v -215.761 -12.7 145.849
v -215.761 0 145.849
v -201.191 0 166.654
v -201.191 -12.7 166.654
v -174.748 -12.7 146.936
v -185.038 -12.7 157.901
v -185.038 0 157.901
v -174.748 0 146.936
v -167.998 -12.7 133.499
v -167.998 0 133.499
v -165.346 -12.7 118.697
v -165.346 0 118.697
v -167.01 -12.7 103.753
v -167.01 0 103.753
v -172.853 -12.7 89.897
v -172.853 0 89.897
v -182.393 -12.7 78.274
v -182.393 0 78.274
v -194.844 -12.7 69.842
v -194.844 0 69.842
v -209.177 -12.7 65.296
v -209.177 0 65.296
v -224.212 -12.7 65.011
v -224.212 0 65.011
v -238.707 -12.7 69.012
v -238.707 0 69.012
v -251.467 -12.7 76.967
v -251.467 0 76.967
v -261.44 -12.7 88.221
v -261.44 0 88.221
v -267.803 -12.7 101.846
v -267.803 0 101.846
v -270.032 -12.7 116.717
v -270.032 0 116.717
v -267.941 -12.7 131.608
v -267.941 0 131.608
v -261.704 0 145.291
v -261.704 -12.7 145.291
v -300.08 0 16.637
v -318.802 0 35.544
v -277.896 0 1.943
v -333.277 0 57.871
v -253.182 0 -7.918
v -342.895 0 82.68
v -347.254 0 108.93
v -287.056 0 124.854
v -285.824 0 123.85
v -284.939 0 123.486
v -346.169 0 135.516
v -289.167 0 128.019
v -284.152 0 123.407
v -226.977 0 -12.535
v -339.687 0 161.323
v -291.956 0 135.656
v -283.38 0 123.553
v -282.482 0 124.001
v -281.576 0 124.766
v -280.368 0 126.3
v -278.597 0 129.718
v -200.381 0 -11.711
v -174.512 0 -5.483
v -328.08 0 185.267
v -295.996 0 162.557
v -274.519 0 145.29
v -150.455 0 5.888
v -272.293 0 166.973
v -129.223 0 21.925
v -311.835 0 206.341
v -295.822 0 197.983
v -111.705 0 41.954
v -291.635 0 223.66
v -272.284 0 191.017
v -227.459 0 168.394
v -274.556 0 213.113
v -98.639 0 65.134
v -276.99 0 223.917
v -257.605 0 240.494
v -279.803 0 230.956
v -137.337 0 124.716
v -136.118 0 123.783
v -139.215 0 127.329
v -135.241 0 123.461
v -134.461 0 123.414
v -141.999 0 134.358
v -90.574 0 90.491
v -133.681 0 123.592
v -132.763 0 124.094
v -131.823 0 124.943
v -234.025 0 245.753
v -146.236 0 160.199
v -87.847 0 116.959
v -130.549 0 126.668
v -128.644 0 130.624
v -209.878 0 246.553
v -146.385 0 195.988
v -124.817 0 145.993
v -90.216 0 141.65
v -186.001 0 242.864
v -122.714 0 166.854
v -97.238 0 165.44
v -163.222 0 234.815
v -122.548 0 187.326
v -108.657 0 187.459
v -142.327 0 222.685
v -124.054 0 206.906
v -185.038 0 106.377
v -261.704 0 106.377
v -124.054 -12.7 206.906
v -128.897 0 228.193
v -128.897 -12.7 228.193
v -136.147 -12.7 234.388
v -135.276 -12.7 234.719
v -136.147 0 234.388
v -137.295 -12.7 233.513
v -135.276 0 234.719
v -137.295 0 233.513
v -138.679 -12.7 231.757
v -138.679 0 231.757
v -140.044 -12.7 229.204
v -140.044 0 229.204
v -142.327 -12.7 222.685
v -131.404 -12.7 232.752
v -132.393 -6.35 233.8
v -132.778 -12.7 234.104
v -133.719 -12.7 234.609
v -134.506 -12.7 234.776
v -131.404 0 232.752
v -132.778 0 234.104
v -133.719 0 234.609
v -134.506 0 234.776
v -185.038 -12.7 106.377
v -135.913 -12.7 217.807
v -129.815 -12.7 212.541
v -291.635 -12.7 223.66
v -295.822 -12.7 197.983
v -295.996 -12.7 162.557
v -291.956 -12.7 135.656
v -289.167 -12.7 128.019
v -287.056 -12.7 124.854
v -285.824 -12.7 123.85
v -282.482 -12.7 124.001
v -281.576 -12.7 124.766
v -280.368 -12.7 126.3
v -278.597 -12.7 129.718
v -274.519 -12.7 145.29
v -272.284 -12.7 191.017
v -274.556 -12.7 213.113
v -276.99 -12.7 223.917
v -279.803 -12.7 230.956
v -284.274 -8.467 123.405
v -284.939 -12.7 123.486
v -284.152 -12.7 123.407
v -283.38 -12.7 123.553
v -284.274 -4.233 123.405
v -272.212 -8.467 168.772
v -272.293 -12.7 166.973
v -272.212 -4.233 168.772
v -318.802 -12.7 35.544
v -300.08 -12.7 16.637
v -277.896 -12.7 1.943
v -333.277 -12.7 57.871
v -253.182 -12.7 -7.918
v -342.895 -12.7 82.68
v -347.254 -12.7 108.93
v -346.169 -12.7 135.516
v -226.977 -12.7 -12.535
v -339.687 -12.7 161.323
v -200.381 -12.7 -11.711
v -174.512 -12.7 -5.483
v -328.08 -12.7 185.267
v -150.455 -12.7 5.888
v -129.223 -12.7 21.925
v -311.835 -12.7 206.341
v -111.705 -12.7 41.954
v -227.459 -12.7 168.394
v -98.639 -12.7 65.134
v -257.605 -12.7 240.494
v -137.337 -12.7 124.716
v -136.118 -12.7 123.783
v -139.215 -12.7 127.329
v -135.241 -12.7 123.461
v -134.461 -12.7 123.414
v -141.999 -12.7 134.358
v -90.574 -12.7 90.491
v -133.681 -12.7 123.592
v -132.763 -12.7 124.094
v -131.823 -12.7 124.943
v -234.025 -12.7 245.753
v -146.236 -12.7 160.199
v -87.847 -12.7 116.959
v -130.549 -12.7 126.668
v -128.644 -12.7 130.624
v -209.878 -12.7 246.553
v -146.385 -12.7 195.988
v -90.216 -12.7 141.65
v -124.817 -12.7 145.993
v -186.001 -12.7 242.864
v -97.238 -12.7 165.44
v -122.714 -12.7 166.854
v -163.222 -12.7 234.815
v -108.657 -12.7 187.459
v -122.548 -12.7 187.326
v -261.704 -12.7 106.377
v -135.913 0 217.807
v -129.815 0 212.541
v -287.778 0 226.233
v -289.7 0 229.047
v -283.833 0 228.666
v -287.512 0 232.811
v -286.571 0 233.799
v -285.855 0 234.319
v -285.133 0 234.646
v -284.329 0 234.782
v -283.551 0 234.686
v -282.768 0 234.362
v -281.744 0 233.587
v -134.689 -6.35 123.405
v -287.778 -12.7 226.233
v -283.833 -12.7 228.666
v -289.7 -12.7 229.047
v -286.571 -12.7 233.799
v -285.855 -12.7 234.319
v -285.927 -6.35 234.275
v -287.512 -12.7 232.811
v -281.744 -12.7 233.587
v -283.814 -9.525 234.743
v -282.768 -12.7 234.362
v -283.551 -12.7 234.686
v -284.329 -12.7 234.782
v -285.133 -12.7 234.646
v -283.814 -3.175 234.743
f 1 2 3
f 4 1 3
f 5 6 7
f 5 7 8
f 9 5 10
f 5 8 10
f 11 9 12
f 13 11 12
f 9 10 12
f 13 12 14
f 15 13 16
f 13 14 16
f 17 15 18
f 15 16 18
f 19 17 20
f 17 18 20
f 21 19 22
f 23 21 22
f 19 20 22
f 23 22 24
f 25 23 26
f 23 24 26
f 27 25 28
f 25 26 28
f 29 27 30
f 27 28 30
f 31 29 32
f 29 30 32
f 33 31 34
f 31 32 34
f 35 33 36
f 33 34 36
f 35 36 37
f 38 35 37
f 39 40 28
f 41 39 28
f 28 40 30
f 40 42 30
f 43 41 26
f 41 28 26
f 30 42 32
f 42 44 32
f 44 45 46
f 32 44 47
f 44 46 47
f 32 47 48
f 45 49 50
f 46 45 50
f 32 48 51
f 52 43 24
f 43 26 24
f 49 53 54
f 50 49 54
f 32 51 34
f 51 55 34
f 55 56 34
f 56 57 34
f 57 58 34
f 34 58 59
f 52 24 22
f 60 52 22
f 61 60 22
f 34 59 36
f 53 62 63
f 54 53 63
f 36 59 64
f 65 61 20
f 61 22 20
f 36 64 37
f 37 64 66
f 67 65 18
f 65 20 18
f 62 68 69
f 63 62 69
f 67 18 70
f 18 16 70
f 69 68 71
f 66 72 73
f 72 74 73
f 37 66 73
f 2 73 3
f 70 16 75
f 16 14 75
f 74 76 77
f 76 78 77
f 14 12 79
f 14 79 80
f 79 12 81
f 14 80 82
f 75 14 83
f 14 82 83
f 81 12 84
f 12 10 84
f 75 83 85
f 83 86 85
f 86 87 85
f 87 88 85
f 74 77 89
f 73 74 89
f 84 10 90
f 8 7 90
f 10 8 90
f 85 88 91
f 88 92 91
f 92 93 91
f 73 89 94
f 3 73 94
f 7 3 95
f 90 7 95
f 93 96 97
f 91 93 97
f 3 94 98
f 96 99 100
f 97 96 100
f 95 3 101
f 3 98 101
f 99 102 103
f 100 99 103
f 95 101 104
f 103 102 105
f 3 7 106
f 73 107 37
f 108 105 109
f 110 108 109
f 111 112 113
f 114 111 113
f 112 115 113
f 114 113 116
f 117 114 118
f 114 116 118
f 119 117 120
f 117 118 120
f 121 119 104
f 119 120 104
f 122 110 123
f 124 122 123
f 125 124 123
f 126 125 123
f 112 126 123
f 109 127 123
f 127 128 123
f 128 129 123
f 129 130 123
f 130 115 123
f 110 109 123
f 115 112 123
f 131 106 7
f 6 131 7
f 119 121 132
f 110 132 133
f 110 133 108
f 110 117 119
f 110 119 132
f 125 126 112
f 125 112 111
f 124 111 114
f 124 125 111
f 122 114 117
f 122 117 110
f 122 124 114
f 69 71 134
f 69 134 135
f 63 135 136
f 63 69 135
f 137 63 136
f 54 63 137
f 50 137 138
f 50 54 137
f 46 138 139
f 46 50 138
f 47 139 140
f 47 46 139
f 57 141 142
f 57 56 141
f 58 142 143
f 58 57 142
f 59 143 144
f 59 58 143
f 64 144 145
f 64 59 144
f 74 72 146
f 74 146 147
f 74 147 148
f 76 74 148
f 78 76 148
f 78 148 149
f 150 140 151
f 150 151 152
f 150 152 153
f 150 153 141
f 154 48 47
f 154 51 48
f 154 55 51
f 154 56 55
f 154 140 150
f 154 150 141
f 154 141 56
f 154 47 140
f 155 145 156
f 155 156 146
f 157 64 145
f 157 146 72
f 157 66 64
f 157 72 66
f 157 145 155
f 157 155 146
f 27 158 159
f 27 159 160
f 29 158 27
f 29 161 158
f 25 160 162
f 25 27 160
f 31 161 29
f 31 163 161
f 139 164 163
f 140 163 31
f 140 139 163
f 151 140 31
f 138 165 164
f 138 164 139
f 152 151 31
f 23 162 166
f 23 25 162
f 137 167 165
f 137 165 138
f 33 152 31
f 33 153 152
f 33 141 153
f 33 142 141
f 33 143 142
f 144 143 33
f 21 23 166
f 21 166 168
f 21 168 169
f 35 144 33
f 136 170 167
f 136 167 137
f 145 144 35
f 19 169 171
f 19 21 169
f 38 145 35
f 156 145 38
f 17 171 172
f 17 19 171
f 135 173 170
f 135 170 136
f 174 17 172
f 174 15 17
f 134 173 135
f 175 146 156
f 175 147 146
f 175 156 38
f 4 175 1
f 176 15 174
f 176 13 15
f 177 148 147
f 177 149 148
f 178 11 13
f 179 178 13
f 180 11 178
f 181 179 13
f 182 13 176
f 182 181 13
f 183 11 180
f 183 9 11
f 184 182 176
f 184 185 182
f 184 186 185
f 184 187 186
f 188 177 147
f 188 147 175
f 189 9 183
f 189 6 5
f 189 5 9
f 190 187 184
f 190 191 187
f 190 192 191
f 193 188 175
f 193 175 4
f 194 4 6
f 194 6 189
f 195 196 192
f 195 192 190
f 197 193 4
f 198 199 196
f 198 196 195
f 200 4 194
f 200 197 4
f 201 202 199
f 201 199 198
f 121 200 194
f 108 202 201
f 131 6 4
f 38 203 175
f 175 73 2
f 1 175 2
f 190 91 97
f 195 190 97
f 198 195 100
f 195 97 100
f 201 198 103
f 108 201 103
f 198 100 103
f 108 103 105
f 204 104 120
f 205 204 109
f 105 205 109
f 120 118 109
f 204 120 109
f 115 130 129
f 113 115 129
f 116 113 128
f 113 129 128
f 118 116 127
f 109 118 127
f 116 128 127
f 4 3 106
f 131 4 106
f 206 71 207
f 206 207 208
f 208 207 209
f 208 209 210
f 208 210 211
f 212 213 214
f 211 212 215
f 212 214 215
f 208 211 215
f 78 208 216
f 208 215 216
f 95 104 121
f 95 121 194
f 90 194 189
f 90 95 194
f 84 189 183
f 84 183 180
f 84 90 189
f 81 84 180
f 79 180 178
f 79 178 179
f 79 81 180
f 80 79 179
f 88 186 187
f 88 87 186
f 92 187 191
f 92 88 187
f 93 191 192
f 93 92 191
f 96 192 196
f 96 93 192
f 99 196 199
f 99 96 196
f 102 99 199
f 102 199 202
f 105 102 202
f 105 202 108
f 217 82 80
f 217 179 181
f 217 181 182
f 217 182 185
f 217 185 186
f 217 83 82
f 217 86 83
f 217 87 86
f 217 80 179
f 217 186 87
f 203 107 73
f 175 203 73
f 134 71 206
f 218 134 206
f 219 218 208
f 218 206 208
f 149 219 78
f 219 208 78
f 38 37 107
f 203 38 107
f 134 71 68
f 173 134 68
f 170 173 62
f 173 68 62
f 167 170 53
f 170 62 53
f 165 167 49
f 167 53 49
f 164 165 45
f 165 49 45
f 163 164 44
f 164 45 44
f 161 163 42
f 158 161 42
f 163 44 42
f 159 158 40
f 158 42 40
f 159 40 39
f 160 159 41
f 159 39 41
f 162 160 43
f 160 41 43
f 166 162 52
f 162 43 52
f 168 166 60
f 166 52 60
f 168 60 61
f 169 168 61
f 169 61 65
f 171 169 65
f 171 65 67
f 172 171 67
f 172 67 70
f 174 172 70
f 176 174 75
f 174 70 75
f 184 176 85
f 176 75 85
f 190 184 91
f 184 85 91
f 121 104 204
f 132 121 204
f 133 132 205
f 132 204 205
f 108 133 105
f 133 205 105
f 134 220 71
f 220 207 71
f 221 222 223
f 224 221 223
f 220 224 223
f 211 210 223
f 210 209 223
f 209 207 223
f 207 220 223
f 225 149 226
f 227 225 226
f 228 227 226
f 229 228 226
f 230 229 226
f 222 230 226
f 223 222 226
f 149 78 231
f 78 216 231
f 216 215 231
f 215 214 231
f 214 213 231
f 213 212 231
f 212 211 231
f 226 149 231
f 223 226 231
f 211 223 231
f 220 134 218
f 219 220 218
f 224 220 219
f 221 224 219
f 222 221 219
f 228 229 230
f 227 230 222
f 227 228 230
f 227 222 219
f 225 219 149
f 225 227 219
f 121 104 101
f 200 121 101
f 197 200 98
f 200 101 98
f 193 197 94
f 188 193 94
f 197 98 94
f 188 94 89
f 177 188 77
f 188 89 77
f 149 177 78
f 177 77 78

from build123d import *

# Parameters (mm, degrees)
F1_DEPTH = 12.7


with BuildPart() as f1:
    # F0 (on Front) → F1 (new body)
    with BuildSketch(Plane.XZ):
        with BuildLine():
            ThreePointArc((-142.3274428777, 222.6854333904), (-132.8231477493, 215.2214126087), (-124.0540535852, 206.9059920145))
            add(Edge.make_bspline(
                [(-124.0540535852, 206.9059920145), (-131.1716571608, 262.9214417948), (-142.3274428777, 222.6854333904)],
                knots=[2.0937308858, 2.0937308858, 2.0937308858, 3.8132780796, 3.8132780796, 3.8132780796], degree=2, weights=[1, 0.6526090294, 1]))
        make_face()
    extrude(amount=F1_DEPTH)


with BuildPart() as f1b:
    # F0 (on Front) → F1, piece 2 (new body)
    with BuildSketch(Plane.XZ):
        with BuildLine():
            add(Edge.make_bspline(
                [(-279.8026851061, 230.956193016), (-286.1662633816, 242.2488007047), (-291.6346317972, 223.6603022563)],
                knots=[2.7687367995, 2.7687367995, 2.7687367995, 3.7846277613, 3.7846277613, 3.7846277613], degree=2, weights=[1, 0.8737456345, 1]))
            ThreePointArc((-291.6346317972, 223.6603022563), (-285.8163741449, 227.4667158631), (-279.8026851061, 230.956193016))
        make_face()
    extrude(amount=F1_DEPTH)


with BuildPart() as f1c:
    # F0 (on Front) → F1, piece 3 (new body)
    with BuildSketch(Plane.XZ):
        with BuildLine():
            ThreePointArc((-291.6346317972, 223.6603022563), (-277.8955929936, 1.9433971257), (-87.8468968183, 116.9592233847))
            ThreePointArc((-87.8468968183, 116.9592233847), (-97.2383659621, 165.4395786538), (-124.0540535852, 206.9059920145))
            add(Edge.make_bspline(
                [(-134.688615799, 123.4045103192), (-113.4439371438, 123.4045103192), (-124.0540535852, 206.9059920145)],
                knots=[0, 0, 0, 2.0937308858, 2.0937308858, 2.0937308858], degree=2, weights=[1, 0.5002875867, 1]))
            add(Edge.make_bspline(
                [(-142.3274428777, 222.6854333904), (-169.8539483012, 123.4045103192), (-134.688615799, 123.4045103192)],
                knots=[3.8132780796, 3.8132780796, 3.8132780796, 6.2831853072, 6.2831853072, 6.2831853072], degree=2, weights=[1, 0.3295649199, 1]))
            ThreePointArc((-142.3274428777, 222.6854333904), (-209.8779671523, 246.5525468003), (-279.8026851061, 230.956193016))
            add(Edge.make_bspline(
                [(-284.2741906643, 123.4045103192), (-274.0980093267, 123.4045103192), (-272.2118550643, 168.7715711681), (-270.3257008019, 214.138632017), (-279.8026851061, 230.956193016)],
                knots=[0, 0, 0, 1.3843683997, 1.3843683997, 2.7687367995, 2.7687367995, 2.7687367995], degree=2, weights=[1, 0.769853852, 1, 0.769853852, 1]))
            add(Edge.make_bspline(
                [(-291.6346317972, 223.6603022563), (-321.1279019301, 123.4045103192), (-284.2741906643, 123.4045103192)],
                knots=[3.7846277613, 3.7846277613, 3.7846277613, 6.2831853072, 6.2831853072, 6.2831853072], degree=2, weights=[1, 0.3160067137, 1]))
        make_face()
        with BuildLine():
            ThreePointArc((-185.0382212393, 157.9005503057), (-209.177316884, 65.2957104263), (-261.7043758333, 145.2910877038))
            Line((-261.7043758333, 145.2910877038), (-261.7043758333, 106.3765979417))
            Line((-261.7043758333, 106.3765979417), (-227.4589546121, 168.3944881935))
            Line((-227.4589546121, 168.3944881935), (-215.7607513139, 145.8487116579))
            Line((-215.7607513139, 145.8487116579), (-201.1907323994, 166.654349087))
            Line((-201.1907323994, 166.654349087), (-185.0382212393, 106.3765979417))
            Line((-185.0382212393, 106.3765979417), (-185.0382212393, 157.9005503057))
        make_face(mode=Mode.SUBTRACT)
    extrude(amount=F1_DEPTH)


solid = Compound([f1.part, f1b.part, f1c.part])
